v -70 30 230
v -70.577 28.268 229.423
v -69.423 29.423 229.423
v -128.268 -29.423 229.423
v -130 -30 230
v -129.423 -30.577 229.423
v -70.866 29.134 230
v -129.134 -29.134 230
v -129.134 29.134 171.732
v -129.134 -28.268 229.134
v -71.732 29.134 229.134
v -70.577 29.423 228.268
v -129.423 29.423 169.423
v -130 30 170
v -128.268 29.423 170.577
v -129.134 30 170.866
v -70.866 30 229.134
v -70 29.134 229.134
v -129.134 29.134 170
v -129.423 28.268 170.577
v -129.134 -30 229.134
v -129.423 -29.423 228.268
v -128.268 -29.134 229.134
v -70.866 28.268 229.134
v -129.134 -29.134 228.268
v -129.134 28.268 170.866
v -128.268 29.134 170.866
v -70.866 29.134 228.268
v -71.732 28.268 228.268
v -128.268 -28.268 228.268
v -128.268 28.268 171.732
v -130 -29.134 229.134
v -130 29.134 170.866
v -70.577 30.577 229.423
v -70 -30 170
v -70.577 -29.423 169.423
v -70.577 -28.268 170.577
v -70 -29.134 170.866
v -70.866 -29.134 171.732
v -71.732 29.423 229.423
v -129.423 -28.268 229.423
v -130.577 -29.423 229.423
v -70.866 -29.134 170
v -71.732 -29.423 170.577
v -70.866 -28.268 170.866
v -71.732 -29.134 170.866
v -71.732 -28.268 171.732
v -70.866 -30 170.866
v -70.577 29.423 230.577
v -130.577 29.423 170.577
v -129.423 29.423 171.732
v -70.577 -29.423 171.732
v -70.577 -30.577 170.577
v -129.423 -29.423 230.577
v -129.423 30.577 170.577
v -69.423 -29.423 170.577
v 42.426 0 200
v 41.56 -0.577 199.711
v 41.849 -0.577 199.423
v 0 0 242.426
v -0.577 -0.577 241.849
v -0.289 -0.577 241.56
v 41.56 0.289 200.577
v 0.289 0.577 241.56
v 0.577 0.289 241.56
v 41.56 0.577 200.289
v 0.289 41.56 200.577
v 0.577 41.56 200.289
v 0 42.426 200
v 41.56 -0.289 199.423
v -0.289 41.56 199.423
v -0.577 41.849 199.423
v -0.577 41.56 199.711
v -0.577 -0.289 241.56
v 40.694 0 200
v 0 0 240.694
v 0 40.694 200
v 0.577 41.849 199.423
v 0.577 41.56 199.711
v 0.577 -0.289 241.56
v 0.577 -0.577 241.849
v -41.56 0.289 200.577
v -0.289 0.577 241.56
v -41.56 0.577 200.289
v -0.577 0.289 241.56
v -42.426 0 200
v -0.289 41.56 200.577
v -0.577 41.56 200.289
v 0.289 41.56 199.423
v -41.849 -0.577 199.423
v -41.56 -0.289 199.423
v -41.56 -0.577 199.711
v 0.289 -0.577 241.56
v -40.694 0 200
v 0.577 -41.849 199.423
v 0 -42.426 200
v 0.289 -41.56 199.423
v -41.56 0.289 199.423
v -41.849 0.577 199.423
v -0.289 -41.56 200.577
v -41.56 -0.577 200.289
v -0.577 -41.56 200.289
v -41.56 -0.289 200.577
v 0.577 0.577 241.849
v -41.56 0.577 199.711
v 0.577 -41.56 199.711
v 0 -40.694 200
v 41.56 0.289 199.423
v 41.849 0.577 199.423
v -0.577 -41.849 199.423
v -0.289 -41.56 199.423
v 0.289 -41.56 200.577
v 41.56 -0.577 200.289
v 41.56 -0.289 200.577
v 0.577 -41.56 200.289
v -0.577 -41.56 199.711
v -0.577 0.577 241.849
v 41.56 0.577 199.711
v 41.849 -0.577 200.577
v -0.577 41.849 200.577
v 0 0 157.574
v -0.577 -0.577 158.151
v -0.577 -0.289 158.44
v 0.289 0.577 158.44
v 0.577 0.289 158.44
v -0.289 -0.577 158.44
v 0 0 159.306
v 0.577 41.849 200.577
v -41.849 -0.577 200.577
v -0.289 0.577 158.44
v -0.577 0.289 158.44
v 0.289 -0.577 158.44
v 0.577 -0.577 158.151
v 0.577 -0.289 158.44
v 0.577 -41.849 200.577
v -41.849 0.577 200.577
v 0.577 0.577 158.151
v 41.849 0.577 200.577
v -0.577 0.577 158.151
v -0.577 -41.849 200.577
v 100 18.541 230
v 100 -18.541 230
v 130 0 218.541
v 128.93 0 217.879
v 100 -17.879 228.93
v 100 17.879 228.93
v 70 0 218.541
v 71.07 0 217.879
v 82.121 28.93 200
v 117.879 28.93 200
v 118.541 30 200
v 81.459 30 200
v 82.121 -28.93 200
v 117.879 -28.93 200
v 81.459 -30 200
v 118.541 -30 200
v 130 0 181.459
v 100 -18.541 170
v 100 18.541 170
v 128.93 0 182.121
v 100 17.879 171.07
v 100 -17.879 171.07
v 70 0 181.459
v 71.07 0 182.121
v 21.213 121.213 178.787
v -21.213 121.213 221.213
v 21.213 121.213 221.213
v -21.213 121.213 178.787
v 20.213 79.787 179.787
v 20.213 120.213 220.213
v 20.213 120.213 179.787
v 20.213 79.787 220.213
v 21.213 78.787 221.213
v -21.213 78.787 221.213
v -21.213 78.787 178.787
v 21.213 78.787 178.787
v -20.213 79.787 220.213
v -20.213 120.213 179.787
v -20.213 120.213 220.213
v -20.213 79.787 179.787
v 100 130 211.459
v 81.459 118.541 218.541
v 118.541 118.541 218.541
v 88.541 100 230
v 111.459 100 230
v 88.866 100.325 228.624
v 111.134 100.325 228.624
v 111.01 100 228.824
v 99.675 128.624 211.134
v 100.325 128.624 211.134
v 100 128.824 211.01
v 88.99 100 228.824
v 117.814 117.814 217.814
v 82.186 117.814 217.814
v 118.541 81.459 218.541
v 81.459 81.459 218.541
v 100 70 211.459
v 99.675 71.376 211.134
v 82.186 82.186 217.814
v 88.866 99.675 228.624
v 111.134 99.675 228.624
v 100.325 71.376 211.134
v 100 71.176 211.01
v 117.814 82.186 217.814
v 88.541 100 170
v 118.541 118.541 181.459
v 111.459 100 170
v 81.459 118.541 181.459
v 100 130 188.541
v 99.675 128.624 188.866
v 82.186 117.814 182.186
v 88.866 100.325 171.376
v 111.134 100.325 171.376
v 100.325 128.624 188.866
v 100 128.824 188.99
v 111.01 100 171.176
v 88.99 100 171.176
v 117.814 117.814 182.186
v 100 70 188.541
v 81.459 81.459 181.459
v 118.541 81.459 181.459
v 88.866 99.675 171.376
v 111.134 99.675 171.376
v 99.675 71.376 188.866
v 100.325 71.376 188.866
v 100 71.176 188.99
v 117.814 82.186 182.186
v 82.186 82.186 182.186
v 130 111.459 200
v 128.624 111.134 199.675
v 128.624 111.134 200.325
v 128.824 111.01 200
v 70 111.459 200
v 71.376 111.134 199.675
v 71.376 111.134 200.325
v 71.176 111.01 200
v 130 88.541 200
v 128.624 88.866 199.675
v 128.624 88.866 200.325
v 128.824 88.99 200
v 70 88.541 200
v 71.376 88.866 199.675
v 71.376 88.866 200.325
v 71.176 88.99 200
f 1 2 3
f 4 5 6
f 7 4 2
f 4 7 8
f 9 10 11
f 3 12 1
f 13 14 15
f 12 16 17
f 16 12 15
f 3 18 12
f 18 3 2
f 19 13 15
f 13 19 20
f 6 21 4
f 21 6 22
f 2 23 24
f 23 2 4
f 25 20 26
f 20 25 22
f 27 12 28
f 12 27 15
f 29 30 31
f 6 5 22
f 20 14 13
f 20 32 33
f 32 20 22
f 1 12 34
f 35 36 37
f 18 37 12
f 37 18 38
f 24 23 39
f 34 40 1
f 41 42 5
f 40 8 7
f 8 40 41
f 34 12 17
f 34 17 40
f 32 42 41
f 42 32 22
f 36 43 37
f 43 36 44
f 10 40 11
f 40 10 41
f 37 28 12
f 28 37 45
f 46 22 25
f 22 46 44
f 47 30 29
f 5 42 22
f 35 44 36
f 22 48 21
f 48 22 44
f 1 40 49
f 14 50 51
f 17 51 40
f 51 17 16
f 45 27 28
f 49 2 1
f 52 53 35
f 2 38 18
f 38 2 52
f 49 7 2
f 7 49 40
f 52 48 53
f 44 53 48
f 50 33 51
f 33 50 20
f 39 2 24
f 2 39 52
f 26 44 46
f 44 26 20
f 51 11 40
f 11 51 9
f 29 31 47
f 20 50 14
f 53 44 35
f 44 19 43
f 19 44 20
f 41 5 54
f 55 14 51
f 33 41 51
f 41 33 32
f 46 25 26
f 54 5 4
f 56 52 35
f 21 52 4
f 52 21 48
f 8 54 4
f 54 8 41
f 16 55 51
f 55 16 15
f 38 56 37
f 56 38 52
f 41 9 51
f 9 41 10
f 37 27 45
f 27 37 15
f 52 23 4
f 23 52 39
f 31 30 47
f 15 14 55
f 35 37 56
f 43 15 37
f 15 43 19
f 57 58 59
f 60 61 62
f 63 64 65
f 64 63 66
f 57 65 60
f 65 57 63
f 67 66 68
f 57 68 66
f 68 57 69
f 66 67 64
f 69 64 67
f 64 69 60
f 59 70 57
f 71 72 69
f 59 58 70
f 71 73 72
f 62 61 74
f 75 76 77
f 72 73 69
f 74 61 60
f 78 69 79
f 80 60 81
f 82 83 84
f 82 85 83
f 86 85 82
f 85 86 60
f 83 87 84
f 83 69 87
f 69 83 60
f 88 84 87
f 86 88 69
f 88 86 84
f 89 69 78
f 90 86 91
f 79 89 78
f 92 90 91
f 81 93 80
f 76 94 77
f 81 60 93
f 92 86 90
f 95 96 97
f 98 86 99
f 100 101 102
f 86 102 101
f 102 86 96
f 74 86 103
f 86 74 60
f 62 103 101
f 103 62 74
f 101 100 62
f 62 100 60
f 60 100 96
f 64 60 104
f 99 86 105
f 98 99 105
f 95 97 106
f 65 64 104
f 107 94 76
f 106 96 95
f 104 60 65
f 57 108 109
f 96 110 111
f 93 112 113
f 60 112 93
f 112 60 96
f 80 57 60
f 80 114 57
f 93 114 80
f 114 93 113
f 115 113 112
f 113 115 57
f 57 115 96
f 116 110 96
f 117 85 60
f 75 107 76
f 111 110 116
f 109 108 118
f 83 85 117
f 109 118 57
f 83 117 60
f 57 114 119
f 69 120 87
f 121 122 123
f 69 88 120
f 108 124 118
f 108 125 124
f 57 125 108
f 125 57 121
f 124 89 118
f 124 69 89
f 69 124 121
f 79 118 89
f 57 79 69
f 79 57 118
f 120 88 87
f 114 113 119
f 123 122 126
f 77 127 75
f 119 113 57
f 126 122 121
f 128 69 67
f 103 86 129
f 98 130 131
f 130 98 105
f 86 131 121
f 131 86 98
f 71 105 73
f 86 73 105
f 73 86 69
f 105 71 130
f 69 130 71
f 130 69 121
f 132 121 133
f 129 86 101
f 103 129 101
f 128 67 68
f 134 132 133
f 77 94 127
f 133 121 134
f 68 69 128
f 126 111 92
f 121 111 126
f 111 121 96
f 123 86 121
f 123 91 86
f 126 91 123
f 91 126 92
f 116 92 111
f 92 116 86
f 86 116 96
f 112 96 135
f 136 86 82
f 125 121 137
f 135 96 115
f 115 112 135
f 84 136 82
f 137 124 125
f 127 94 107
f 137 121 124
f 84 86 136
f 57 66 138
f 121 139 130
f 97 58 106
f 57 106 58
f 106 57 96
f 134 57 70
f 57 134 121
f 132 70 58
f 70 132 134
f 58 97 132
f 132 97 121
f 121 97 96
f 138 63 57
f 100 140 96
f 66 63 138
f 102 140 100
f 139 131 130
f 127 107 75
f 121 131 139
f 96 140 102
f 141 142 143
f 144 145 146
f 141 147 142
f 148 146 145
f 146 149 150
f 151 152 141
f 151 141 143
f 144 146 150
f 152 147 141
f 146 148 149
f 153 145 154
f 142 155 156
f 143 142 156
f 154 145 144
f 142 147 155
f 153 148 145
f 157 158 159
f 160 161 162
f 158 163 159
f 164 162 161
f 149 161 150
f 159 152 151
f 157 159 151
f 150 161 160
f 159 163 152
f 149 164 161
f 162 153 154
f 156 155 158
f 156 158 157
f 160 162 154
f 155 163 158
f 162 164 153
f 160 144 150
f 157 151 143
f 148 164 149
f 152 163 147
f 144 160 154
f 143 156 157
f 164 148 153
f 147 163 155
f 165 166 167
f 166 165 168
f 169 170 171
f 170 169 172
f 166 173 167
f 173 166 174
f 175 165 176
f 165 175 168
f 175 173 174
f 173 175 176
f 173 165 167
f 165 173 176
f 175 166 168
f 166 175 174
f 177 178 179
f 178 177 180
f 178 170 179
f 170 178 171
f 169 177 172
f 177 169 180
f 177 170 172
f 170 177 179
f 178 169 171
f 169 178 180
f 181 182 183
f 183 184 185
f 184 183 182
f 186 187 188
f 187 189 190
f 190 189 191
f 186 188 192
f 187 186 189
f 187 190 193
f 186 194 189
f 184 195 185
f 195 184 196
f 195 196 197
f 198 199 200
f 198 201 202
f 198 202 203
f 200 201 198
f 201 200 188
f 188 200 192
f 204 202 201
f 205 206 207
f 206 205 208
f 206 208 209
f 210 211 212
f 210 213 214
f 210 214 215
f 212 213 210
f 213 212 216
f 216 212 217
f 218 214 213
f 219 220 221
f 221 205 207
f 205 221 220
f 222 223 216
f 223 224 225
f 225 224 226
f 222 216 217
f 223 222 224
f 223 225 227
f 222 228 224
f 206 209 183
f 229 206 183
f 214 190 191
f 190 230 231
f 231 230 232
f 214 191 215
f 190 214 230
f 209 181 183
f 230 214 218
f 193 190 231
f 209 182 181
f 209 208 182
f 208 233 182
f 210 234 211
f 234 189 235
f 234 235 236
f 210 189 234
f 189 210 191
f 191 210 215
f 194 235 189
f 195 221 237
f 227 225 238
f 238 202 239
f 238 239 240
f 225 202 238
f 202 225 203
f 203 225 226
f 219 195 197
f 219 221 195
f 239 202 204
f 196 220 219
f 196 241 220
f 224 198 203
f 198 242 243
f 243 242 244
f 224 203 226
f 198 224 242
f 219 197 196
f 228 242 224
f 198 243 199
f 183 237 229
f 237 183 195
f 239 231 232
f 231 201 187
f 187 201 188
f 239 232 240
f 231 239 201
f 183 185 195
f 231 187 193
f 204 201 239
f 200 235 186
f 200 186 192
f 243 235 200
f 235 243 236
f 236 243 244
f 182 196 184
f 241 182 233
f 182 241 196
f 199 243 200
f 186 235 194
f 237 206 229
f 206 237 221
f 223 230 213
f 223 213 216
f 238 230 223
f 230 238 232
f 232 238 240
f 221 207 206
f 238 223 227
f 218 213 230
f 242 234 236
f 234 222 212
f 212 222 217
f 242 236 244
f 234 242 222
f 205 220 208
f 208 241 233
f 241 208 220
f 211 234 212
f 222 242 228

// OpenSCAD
// This file is part of PolySymmetrica, a Polyhedral Geometry Modelling System.
// Copyright 2025-2026 Susan Witts
// SPDX-License-Identifier: MIT

use <../../core/placement.scad>
use <../../models/platonics_all.scad>

// Inter-radius - sets the size of the shapes
IR = 30;

DISPLAY_OFFSET_EXAMPLE = 200; // set to 0 to overlay edge examples onto other examples

COLORS = [ "black", "red", "green", "yellow", "blue", "magenta", "cyan", "white", "orange" ];
module color_map(L, i) { color(COLORS[L[i]]) children(); }

translate([0,0,DISPLAY_OFFSET_EXAMPLE]) {
    // Triangular-faced regular polyhedra
    translate([-100, 0, 0])
    place_on_faces(tetrahedron(), IR) {
        color_map([1, 4, 2, 3], $ps_face_idx)
            translate([0,0,-1]) cylinder(h = 1, r = $ps_face_radius, $fn = $ps_vertex_count);
    }

    translate([0, 0, 0])
    place_on_faces(octahedron(), IR) {
        color_map([1, 4, 2, 3, 2, 3, 1, 4], $ps_face_idx)
            translate([0,0,-1]) cylinder(h = 1, r = $ps_face_radius, $fn = $ps_vertex_count);
    }


    translate([100, 0, 0])
    place_on_faces(icosahedron(), IR) {
        color_map([1, 4, 2, 3, 8, 3, 8, 2, 3, 2,    1, 8, 4, 4, 1, 8, 4, 3, 2, 1 ], $ps_face_idx)
            translate([0,0,-1]) cylinder(h = 1, r = $ps_face_radius, $fn = $ps_vertex_count);
    }

    // Duals
    translate([0, 100, 0])
    place_on_faces(hexahedron(), IR) {
        color_map([1, 8, 4, 3, 7, 2 ], $ps_face_idx)
            translate([0,0,-1]) cylinder(h = 1, r = $ps_face_radius, $fn = $ps_vertex_count);
    }

    translate([100, 100, 0])
    place_on_faces(dodecahedron(), IR) {
        color_map([ 1, 4, 3, 4, 4, 2, 3, 2, 2, 3, 1, 1 ], $ps_face_idx)
            translate([0,0,-1]) cylinder(h = 1, r = $ps_face_radius, $fn = $ps_vertex_count);
    }
}
